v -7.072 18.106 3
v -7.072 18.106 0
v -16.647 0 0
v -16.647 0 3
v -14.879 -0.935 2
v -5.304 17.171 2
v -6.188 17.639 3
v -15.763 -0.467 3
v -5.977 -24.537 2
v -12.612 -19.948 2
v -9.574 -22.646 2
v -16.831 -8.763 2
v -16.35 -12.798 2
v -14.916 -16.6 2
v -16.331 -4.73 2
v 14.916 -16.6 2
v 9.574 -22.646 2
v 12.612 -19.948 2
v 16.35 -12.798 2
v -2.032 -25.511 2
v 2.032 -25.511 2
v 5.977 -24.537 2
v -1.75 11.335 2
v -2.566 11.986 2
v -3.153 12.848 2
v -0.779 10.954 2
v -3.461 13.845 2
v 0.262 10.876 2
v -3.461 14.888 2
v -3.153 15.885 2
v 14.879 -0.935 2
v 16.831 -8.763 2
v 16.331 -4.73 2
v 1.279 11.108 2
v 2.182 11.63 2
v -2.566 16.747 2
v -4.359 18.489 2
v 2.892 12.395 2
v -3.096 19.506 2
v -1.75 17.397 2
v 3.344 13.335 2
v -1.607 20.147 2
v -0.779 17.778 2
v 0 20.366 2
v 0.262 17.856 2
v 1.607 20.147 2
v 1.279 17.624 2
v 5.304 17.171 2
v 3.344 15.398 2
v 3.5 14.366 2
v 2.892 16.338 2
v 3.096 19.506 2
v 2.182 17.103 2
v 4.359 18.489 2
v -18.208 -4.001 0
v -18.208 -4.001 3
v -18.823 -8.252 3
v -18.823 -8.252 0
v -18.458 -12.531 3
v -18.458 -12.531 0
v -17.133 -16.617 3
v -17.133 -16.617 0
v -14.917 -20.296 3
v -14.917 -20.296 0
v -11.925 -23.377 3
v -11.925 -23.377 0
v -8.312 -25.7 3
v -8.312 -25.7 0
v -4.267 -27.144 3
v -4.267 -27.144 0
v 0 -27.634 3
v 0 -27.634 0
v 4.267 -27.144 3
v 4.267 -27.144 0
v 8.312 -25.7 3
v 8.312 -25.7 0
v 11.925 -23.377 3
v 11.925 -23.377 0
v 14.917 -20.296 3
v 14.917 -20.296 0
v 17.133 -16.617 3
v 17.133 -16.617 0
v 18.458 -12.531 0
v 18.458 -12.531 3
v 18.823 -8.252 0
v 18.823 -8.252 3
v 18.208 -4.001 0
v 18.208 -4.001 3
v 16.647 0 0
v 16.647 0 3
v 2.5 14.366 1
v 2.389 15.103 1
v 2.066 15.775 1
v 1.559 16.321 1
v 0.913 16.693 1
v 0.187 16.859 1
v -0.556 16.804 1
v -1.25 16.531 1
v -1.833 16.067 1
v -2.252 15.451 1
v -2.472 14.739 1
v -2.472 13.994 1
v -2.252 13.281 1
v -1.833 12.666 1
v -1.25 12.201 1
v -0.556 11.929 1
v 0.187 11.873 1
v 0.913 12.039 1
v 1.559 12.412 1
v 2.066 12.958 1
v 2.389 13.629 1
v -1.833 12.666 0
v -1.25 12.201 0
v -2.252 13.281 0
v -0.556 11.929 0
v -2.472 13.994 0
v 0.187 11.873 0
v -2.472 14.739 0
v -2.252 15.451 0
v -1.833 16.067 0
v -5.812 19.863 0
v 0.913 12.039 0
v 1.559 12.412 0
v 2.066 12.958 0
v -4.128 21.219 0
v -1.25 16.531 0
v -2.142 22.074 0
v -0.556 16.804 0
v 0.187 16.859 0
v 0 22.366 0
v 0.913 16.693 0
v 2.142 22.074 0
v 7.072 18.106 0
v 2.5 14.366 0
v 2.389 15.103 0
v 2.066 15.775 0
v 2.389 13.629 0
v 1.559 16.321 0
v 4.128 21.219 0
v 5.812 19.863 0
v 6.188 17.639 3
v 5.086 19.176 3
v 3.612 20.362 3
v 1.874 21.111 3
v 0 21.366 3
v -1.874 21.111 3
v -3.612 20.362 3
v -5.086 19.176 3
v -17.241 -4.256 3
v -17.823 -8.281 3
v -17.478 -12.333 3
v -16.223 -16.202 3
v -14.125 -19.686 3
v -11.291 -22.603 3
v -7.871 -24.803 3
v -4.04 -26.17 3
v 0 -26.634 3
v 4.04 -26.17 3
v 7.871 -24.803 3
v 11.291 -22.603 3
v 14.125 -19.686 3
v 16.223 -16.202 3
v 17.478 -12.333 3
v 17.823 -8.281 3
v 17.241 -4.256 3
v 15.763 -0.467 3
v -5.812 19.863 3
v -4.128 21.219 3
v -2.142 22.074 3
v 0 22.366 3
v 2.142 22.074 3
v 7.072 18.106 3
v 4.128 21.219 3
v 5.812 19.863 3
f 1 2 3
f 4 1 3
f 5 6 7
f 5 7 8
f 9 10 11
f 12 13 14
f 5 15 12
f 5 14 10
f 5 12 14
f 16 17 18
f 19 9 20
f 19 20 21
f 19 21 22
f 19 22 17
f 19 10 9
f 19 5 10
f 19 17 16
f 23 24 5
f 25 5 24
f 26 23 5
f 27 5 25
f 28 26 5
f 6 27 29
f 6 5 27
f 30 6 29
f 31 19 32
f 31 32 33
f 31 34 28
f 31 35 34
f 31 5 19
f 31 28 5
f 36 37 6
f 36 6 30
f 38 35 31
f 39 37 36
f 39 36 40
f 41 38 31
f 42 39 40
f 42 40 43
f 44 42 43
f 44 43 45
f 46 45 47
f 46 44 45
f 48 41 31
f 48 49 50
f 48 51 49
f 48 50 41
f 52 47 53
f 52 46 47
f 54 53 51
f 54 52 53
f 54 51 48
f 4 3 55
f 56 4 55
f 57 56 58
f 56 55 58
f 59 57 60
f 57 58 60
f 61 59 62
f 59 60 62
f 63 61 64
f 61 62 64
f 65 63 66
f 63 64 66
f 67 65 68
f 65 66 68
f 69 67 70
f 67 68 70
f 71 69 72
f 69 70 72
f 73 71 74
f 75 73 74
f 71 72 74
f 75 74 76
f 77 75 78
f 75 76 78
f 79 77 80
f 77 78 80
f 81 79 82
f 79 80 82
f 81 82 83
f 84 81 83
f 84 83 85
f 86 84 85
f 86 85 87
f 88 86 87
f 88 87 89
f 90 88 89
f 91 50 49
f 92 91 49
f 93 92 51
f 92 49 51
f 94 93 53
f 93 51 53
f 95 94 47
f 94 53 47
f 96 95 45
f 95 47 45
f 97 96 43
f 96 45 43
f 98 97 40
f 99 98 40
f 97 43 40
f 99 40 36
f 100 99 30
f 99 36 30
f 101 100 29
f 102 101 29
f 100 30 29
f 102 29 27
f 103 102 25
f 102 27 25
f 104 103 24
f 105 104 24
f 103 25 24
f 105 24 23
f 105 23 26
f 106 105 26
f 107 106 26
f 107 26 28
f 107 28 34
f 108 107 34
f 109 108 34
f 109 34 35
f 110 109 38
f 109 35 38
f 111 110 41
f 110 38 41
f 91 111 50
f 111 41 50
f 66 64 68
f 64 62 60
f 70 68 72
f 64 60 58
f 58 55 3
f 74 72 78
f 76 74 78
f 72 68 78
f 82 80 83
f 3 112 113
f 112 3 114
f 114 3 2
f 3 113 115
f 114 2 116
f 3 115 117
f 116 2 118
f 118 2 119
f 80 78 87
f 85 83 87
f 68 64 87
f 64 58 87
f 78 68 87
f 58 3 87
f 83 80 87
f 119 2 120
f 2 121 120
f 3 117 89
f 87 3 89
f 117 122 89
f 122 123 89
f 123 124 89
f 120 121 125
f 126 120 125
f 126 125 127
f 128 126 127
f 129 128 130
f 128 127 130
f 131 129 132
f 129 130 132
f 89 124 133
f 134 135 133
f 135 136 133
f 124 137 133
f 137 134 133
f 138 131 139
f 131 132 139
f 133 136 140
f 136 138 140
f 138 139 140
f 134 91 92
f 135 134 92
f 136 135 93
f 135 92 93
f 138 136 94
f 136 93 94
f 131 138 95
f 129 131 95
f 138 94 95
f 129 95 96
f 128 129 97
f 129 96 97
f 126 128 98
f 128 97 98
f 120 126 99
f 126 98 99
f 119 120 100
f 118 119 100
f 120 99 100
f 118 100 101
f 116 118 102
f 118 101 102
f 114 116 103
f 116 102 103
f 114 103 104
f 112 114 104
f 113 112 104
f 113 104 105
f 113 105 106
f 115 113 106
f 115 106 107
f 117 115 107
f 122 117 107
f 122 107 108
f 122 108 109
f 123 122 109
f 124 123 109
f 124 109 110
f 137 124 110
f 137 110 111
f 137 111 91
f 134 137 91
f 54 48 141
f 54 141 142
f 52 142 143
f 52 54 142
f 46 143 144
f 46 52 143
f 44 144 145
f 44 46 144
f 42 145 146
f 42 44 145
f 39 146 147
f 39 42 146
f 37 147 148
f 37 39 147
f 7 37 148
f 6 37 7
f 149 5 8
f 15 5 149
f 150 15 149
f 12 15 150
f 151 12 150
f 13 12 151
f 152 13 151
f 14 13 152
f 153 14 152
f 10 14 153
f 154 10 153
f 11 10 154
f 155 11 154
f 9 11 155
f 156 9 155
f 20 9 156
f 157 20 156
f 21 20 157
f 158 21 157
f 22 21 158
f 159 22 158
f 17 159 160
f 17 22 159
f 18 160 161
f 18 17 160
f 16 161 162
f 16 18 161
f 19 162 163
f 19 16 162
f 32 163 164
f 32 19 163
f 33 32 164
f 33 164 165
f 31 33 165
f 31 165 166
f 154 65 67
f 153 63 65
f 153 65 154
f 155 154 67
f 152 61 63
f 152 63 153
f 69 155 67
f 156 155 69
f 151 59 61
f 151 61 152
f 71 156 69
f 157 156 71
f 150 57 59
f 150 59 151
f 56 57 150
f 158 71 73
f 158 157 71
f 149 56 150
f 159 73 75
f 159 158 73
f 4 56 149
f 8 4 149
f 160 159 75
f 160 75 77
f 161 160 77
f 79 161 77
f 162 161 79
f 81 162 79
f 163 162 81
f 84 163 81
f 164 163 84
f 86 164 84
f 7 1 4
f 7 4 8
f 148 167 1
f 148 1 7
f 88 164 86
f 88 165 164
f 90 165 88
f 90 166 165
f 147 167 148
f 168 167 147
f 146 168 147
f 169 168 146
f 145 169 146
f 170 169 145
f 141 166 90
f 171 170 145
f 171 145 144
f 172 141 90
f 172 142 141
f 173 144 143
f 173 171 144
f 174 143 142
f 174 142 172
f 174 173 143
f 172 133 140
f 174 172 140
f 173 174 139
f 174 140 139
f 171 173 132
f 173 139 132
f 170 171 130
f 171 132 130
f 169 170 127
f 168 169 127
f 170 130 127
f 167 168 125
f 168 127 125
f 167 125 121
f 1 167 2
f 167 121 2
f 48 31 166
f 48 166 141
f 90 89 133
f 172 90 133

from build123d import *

# Parameters (mm, degrees)
F1_DEPTH = 3
F2_R     = 2.5
F3_DEPTH = 25
F5_DEPTH = 1
F6_SIZE  = 0.99999


# Not quite as in the source:
# - a fillet or chamfer is up to 0.001 mm smaller than in the source, because OpenCascade refuses the exact size


with BuildPart() as f1:
    # F0 (on Top) → F1 (new body)
    with BuildSketch(Plane.XY):
        with BuildLine():
            Line((-7.0720659795, 18.1059757224), (-16.646664491, 0))
            ThreePointArc((-16.646664491, 0), (0, -27.6337946959), (16.646664491, 0))
            Line((16.646664491, 0), (7.0720659795, 18.1059757224))
            ThreePointArc((7.0720659795, 18.1059757224), (0, 22.3662053041), (-7.0720659795, 18.1059757224))
        make_face()
    extrude(amount=F1_DEPTH)

    # F2 (on face) → F3 (cut)
    with BuildSketch(Plane.XY.offset(3)):
        with Locations((0, 14.3662053041)):
            Circle(F2_R)
    extrude(amount=-F3_DEPTH, mode=Mode.SUBTRACT)

    # F4 (on face) → F5 (cut)
    with BuildSketch(Plane.XY.offset(3)):
        with BuildLine():
            Line((15.7626562435, -0.4674713023), (6.1880577321, 17.6385044201))
            ThreePointArc((6.1880577321, 17.6385044201), (0, 21.3662053041), (-6.1880577321, 17.6385044201))
            Line((-6.1880577321, 17.6385044201), (-15.7626562435, -0.4674713023))
            ThreePointArc((-15.7626562435, -0.4674713023), (0, -26.6337946959), (15.7626562435, -0.4674713023))
        make_face()
    extrude(amount=-F5_DEPTH, mode=Mode.SUBTRACT)

    # F6 (size 1 in the source; OpenCascade refuses exactly that, so slightly less here)
    f6_edges = [f1.edges().sort_by_distance(p)[0] for p in [
        (0, -26.633795, 2),
        (-10.975357, 8.585517, 2),
        (10.975357, 8.585517, 2),
        (0, 21.366205, 2),
        (-2.5, 14.366205, 2),
    ]]
    chamfer(f6_edges, length=F6_SIZE)


solid = f1.part
